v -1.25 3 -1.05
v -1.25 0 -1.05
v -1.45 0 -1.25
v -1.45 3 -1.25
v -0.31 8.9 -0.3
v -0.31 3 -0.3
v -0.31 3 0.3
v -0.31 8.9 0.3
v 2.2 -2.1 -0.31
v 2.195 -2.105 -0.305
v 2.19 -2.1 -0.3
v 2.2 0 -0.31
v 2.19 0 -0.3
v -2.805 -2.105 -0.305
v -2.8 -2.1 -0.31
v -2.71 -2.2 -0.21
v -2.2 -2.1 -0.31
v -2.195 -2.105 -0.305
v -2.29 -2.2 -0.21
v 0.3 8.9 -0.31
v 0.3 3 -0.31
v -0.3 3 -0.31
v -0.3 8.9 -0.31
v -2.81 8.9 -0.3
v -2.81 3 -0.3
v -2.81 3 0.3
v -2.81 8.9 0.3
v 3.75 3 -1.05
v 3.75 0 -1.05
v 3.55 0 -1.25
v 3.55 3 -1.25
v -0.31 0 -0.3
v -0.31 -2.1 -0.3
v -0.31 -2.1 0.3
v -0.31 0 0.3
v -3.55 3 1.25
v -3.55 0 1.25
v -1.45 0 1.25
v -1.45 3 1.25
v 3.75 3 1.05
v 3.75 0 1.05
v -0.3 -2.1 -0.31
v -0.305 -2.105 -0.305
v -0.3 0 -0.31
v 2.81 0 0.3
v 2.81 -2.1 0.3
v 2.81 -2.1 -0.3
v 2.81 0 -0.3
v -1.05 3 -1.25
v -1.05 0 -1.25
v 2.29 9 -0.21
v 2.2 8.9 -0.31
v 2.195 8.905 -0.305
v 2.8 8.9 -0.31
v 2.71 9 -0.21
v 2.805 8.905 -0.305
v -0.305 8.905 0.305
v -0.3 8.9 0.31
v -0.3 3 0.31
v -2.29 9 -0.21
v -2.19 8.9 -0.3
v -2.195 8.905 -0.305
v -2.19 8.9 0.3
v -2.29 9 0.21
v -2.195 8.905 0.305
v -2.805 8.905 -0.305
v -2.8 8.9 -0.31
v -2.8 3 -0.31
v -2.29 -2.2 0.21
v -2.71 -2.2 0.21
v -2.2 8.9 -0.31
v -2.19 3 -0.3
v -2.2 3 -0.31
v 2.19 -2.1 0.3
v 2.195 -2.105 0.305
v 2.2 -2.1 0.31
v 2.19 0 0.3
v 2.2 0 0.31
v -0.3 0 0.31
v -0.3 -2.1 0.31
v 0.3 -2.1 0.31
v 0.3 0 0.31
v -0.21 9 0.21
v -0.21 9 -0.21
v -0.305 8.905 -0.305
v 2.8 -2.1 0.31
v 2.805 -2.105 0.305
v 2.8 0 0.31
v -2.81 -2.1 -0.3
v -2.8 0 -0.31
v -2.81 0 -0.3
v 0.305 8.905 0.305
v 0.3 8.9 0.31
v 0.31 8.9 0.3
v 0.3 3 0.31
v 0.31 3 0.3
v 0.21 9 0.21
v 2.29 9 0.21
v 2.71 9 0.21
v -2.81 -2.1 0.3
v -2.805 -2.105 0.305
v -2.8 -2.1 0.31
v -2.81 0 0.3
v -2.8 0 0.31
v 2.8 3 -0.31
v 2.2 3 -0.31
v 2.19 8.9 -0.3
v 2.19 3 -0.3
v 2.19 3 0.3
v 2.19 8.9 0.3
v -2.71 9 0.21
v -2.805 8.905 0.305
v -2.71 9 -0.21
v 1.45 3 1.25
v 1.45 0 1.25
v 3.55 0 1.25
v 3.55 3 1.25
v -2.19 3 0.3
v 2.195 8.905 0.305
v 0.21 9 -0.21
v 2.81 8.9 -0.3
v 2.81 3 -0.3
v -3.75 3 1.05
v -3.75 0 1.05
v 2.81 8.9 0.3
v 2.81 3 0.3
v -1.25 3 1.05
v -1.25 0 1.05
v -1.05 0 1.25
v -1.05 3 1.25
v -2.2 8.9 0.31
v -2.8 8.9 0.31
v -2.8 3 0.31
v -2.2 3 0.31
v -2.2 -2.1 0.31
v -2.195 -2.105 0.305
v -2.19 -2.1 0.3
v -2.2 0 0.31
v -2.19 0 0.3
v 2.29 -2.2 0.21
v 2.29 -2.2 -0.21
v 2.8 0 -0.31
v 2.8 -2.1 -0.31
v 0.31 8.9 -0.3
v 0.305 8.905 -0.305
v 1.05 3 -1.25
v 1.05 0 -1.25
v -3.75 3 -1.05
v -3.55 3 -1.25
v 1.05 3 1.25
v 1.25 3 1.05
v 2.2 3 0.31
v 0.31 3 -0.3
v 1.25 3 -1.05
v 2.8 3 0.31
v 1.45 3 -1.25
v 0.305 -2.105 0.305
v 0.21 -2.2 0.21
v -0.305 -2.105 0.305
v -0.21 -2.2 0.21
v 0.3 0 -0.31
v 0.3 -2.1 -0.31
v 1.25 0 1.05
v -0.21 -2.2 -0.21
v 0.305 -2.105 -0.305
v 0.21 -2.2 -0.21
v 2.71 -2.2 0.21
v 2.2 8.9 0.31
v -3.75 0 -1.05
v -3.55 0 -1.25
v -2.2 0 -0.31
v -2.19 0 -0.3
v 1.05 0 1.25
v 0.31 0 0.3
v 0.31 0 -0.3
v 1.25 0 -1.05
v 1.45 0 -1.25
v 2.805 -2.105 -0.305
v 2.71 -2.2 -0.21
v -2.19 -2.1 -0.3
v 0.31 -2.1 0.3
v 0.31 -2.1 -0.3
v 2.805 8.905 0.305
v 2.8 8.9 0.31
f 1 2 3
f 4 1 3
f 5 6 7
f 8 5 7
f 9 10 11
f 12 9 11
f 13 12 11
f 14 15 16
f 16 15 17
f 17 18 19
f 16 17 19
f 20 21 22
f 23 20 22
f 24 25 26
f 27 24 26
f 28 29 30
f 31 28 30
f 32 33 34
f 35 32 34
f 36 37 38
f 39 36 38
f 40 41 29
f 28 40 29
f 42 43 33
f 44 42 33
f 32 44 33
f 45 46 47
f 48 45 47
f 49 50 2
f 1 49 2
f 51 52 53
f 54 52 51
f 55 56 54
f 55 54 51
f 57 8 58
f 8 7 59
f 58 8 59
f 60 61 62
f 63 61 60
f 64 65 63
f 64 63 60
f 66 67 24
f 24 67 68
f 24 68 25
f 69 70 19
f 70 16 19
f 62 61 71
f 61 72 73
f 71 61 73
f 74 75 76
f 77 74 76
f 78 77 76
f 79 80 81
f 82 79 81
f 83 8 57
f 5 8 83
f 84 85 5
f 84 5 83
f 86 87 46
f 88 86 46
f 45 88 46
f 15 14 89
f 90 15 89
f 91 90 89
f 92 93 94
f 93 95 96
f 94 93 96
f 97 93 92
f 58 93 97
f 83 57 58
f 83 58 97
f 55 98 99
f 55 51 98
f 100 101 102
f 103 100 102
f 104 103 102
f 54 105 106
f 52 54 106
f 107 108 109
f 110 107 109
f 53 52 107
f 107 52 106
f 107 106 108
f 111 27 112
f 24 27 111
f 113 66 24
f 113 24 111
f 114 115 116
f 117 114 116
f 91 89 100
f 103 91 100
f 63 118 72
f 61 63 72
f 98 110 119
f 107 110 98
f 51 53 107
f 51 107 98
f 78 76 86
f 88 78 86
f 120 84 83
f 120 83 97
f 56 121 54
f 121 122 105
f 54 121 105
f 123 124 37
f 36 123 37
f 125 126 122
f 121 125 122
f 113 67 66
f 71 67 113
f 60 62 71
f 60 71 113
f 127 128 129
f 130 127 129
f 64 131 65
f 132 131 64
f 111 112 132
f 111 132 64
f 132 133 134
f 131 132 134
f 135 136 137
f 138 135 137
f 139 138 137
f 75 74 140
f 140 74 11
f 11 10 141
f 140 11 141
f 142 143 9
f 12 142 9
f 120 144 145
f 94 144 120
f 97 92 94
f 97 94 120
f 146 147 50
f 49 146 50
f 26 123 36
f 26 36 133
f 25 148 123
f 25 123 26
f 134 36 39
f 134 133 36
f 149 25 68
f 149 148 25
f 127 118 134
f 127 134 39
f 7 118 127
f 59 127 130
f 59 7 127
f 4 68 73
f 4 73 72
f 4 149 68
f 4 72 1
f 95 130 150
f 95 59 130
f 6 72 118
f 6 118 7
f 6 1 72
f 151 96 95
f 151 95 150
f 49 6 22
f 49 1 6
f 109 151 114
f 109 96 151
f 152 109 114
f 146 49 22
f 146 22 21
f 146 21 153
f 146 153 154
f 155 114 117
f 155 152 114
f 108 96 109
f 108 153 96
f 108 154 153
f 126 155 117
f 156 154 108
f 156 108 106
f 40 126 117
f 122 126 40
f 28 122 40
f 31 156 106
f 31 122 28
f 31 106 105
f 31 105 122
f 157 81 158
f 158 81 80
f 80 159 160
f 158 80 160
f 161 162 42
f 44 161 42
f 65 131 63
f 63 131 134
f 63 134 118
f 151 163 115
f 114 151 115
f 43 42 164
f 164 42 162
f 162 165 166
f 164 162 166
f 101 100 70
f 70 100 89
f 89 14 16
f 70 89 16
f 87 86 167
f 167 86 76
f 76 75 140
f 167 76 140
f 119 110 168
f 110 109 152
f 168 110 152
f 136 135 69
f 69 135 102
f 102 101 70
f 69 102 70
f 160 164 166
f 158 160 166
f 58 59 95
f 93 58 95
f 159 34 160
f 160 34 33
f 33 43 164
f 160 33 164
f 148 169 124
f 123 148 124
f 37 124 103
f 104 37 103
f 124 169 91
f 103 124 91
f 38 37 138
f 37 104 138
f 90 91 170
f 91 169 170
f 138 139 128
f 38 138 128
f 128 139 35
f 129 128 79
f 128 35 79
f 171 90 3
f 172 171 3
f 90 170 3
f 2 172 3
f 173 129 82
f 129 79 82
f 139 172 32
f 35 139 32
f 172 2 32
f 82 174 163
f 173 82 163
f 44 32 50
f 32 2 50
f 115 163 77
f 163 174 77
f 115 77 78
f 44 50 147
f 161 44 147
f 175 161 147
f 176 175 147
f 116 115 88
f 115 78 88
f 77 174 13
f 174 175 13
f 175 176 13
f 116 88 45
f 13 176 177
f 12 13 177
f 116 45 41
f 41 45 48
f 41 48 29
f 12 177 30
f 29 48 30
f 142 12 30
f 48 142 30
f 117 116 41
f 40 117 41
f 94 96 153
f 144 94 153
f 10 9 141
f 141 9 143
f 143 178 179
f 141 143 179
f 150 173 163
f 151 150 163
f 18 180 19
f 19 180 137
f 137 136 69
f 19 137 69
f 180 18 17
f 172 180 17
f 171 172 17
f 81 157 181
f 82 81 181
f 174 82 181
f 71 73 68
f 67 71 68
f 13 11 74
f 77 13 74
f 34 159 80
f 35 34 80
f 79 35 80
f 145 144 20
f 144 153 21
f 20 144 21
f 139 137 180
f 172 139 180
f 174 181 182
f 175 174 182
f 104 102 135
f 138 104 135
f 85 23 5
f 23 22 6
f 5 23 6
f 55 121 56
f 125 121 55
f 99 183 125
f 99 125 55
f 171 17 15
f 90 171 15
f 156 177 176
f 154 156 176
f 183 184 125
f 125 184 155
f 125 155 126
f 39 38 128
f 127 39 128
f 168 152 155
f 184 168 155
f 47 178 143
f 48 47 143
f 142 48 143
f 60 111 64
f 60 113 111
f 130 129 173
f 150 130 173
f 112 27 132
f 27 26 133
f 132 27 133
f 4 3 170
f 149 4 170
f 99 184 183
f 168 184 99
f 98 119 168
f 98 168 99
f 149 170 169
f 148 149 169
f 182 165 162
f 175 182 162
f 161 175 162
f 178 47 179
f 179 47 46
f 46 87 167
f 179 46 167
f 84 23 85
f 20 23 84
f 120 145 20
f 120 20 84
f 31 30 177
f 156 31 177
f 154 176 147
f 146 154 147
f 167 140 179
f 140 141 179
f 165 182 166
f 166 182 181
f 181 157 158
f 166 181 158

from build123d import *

# Parameters (mm, degrees)
BOSS_EXTRUDE1_DEPTH      = 3
BOSS_EXTRUDE2_DEPTH      = 6
BOSS_EXTRUDE2_DEPTH_BACK = 5.2
CHAMFER1_SIZE            = 0.1


with BuildPart() as part:
    # Sketch2 → Boss-Extrude1 (new body)
    with BuildSketch(Plane(origin=(0, 0, 0), x_dir=(1, 0, 0), z_dir=(0, 1, 0))):
        Polygon((-1.25, -1.05), (-1.05, -1.25), (1.05, -1.25), (1.25, -1.05), (1.45, -1.25), (3.55, -1.25), (3.75, -1.05), (3.75, 1.05), (3.55, 1.25), (1.45, 1.25), (1.25, 1.05), (1.05, 1.25), (-1.05, 1.25), (-1.25, 1.05), (-1.45, 1.25), (-3.55, 1.25), (-3.75, 1.05), (-3.75, -1.05), (-3.55, -1.25), (-1.45, -1.25), align=None)
    extrude(amount=BOSS_EXTRUDE1_DEPTH)

    # Sketch3 → Boss-Extrude2 (add, two sides: drawn at the far end of the back side and taken through both)
    with BuildSketch(Plane(origin=(0, 3, 0), x_dir=(1, 0, 0), z_dir=(0, 1, 0)).offset(-BOSS_EXTRUDE2_DEPTH_BACK)):
        Polygon((0.3, 0.31), (-0.3, 0.31), (-0.31, 0.3), (-0.31, -0.3), (-0.3, -0.31), (0.3, -0.31), (0.31, -0.3), (0.31, 0.3), align=None)
        Polygon((-2.2, -0.31), (-2.19, -0.3), (-2.19, 0.3), (-2.2, 0.31), (-2.8, 0.31), (-2.81, 0.3), (-2.81, -0.3), (-2.8, -0.31), align=None)
        Polygon((2.8, -0.31), (2.81, -0.3), (2.81, 0.3), (2.8, 0.31), (2.2, 0.31), (2.19, 0.3), (2.19, -0.3), (2.2, -0.31), align=None)
    extrude(amount=BOSS_EXTRUDE2_DEPTH + BOSS_EXTRUDE2_DEPTH_BACK)

    # Chamfer1
    # the kernel refuses this chamfer: 0.1 mm, written as the material it takes off along each edge
    with BuildSketch(Plane(origin=(-2.81, 9, -0.557168299), x_dir=(-0.027495876610587656, -0.9996219169112966, 0), z_dir=(0, 0, 1)), Plane(origin=(-1.942831701, 9, -0.31), x_dir=(0, -0.9996219169112968, -0.02749587661058658), z_dir=(-1, 0, 0)), Plane(origin=(-2.19, 9, 0.557168299), x_dir=(0.027495876610587656, -0.9996219169112966, 0), z_dir=(0, 0, -1)), Plane(origin=(-3.057168299, 9, 0.31), x_dir=(0, -0.9996219169112968, 0.02749587661058658), z_dir=(1, 0, 0)), Plane(origin=(2.19, 9, -0.557168299), x_dir=(-0.027495876610587656, -0.9996219169112966, 0), z_dir=(0, 0, 1)), Plane(origin=(3.057168299, 9, -0.31), x_dir=(0, -0.9996219169112968, -0.02749587661058658), z_dir=(-1, 0, 0)), Plane(origin=(2.81, 9, 0.557168299), x_dir=(0.027495876610587656, -0.9996219169112966, 0), z_dir=(0, 0, -1)), Plane(origin=(1.942831701, 9, 0.31), x_dir=(0, -0.9996219169112968, 0.02749587661058658), z_dir=(1, 0, 0)), Plane(origin=(0.557168299, 9, -0.31), x_dir=(0, -0.9996219169112968, -0.02749587661058658), z_dir=(-1, 0, 0)), Plane(origin=(0.31, 9, 0.557168299), x_dir=(0.027495876610586577, -0.9996219169112966, 0), z_dir=(0, 0, -1)), Plane(origin=(-0.557168299, 9, 0.31), x_dir=(0, -0.9996219169112968, 0.02749587661058658), z_dir=(1, 0, 0)), Plane(origin=(-0.31, 9, -0.557168299), x_dir=(-0.027495876610586577, -0.9996219169112966, 0), z_dir=(0, 0, 1))) as chamfer1_piece_1:
        Polygon((CHAMFER1_SIZE * 0.999621916911, CHAMFER1_SIZE * 0.0274958766106), (-CHAMFER1_SIZE * 0.0274958766106, CHAMFER1_SIZE * 0.999621916911), (0, 0), align=None)
    extrude(amount=1.114336598, mode=Mode.SUBTRACT)
    with BuildSketch(Plane(origin=(2.81, -2.2, 0.557168299), x_dir=(0.02749587661058718, 0.9996219169112966, 0), z_dir=(0, 0, -1)), Plane(origin=(3.057168299, -2.2, -0.31), x_dir=(0, 0.9996219169112968, -0.027495876610586105), z_dir=(-1, 0, 0)), Plane(origin=(2.19, -2.2, -0.557168299), x_dir=(-0.02749587661058718, 0.9996219169112966, 0), z_dir=(0, 0, 1)), Plane(origin=(1.942831701, -2.2, 0.31), x_dir=(0, 0.9996219169112968, 0.027495876610586105), z_dir=(1, 0, 0)), Plane(origin=(-0.31, -2.2, -0.557168299), x_dir=(-0.027495876610586105, 0.9996219169112968, 0), z_dir=(0, 0, 1)), Plane(origin=(-0.557168299, -2.2, 0.31), x_dir=(0, 0.9996219169112968, 0.027495876610586105), z_dir=(1, 0, 0)), Plane(origin=(0.31, -2.2, 0.557168299), x_dir=(0.027495876610586105, 0.9996219169112968, 0), z_dir=(0, 0, -1)), Plane(origin=(0.557168299, -2.2, -0.31), x_dir=(0, 0.9996219169112968, -0.027495876610586105), z_dir=(-1, 0, 0)), Plane(origin=(-2.19, -2.2, 0.557168299), x_dir=(0.02749587661058718, 0.9996219169112966, 0), z_dir=(0, 0, -1)), Plane(origin=(-1.942831701, -2.2, -0.31), x_dir=(0, 0.9996219169112968, -0.027495876610586105), z_dir=(-1, 0, 0)), Plane(origin=(-2.81, -2.2, -0.557168299), x_dir=(-0.02749587661058718, 0.9996219169112966, 0), z_dir=(0, 0, 1)), Plane(origin=(-3.057168299, -2.2, 0.31), x_dir=(0, 0.9996219169112968, 0.027495876610586105), z_dir=(1, 0, 0))) as chamfer1_piece_2:
        Polygon((CHAMFER1_SIZE * 0.999621916911, -CHAMFER1_SIZE * 0.0274958766106), (-CHAMFER1_SIZE * 0.0274958766106, -CHAMFER1_SIZE * 0.999621916911), (0, 0), align=None)
    extrude(amount=1.114336598, mode=Mode.SUBTRACT)


solid = part.part
